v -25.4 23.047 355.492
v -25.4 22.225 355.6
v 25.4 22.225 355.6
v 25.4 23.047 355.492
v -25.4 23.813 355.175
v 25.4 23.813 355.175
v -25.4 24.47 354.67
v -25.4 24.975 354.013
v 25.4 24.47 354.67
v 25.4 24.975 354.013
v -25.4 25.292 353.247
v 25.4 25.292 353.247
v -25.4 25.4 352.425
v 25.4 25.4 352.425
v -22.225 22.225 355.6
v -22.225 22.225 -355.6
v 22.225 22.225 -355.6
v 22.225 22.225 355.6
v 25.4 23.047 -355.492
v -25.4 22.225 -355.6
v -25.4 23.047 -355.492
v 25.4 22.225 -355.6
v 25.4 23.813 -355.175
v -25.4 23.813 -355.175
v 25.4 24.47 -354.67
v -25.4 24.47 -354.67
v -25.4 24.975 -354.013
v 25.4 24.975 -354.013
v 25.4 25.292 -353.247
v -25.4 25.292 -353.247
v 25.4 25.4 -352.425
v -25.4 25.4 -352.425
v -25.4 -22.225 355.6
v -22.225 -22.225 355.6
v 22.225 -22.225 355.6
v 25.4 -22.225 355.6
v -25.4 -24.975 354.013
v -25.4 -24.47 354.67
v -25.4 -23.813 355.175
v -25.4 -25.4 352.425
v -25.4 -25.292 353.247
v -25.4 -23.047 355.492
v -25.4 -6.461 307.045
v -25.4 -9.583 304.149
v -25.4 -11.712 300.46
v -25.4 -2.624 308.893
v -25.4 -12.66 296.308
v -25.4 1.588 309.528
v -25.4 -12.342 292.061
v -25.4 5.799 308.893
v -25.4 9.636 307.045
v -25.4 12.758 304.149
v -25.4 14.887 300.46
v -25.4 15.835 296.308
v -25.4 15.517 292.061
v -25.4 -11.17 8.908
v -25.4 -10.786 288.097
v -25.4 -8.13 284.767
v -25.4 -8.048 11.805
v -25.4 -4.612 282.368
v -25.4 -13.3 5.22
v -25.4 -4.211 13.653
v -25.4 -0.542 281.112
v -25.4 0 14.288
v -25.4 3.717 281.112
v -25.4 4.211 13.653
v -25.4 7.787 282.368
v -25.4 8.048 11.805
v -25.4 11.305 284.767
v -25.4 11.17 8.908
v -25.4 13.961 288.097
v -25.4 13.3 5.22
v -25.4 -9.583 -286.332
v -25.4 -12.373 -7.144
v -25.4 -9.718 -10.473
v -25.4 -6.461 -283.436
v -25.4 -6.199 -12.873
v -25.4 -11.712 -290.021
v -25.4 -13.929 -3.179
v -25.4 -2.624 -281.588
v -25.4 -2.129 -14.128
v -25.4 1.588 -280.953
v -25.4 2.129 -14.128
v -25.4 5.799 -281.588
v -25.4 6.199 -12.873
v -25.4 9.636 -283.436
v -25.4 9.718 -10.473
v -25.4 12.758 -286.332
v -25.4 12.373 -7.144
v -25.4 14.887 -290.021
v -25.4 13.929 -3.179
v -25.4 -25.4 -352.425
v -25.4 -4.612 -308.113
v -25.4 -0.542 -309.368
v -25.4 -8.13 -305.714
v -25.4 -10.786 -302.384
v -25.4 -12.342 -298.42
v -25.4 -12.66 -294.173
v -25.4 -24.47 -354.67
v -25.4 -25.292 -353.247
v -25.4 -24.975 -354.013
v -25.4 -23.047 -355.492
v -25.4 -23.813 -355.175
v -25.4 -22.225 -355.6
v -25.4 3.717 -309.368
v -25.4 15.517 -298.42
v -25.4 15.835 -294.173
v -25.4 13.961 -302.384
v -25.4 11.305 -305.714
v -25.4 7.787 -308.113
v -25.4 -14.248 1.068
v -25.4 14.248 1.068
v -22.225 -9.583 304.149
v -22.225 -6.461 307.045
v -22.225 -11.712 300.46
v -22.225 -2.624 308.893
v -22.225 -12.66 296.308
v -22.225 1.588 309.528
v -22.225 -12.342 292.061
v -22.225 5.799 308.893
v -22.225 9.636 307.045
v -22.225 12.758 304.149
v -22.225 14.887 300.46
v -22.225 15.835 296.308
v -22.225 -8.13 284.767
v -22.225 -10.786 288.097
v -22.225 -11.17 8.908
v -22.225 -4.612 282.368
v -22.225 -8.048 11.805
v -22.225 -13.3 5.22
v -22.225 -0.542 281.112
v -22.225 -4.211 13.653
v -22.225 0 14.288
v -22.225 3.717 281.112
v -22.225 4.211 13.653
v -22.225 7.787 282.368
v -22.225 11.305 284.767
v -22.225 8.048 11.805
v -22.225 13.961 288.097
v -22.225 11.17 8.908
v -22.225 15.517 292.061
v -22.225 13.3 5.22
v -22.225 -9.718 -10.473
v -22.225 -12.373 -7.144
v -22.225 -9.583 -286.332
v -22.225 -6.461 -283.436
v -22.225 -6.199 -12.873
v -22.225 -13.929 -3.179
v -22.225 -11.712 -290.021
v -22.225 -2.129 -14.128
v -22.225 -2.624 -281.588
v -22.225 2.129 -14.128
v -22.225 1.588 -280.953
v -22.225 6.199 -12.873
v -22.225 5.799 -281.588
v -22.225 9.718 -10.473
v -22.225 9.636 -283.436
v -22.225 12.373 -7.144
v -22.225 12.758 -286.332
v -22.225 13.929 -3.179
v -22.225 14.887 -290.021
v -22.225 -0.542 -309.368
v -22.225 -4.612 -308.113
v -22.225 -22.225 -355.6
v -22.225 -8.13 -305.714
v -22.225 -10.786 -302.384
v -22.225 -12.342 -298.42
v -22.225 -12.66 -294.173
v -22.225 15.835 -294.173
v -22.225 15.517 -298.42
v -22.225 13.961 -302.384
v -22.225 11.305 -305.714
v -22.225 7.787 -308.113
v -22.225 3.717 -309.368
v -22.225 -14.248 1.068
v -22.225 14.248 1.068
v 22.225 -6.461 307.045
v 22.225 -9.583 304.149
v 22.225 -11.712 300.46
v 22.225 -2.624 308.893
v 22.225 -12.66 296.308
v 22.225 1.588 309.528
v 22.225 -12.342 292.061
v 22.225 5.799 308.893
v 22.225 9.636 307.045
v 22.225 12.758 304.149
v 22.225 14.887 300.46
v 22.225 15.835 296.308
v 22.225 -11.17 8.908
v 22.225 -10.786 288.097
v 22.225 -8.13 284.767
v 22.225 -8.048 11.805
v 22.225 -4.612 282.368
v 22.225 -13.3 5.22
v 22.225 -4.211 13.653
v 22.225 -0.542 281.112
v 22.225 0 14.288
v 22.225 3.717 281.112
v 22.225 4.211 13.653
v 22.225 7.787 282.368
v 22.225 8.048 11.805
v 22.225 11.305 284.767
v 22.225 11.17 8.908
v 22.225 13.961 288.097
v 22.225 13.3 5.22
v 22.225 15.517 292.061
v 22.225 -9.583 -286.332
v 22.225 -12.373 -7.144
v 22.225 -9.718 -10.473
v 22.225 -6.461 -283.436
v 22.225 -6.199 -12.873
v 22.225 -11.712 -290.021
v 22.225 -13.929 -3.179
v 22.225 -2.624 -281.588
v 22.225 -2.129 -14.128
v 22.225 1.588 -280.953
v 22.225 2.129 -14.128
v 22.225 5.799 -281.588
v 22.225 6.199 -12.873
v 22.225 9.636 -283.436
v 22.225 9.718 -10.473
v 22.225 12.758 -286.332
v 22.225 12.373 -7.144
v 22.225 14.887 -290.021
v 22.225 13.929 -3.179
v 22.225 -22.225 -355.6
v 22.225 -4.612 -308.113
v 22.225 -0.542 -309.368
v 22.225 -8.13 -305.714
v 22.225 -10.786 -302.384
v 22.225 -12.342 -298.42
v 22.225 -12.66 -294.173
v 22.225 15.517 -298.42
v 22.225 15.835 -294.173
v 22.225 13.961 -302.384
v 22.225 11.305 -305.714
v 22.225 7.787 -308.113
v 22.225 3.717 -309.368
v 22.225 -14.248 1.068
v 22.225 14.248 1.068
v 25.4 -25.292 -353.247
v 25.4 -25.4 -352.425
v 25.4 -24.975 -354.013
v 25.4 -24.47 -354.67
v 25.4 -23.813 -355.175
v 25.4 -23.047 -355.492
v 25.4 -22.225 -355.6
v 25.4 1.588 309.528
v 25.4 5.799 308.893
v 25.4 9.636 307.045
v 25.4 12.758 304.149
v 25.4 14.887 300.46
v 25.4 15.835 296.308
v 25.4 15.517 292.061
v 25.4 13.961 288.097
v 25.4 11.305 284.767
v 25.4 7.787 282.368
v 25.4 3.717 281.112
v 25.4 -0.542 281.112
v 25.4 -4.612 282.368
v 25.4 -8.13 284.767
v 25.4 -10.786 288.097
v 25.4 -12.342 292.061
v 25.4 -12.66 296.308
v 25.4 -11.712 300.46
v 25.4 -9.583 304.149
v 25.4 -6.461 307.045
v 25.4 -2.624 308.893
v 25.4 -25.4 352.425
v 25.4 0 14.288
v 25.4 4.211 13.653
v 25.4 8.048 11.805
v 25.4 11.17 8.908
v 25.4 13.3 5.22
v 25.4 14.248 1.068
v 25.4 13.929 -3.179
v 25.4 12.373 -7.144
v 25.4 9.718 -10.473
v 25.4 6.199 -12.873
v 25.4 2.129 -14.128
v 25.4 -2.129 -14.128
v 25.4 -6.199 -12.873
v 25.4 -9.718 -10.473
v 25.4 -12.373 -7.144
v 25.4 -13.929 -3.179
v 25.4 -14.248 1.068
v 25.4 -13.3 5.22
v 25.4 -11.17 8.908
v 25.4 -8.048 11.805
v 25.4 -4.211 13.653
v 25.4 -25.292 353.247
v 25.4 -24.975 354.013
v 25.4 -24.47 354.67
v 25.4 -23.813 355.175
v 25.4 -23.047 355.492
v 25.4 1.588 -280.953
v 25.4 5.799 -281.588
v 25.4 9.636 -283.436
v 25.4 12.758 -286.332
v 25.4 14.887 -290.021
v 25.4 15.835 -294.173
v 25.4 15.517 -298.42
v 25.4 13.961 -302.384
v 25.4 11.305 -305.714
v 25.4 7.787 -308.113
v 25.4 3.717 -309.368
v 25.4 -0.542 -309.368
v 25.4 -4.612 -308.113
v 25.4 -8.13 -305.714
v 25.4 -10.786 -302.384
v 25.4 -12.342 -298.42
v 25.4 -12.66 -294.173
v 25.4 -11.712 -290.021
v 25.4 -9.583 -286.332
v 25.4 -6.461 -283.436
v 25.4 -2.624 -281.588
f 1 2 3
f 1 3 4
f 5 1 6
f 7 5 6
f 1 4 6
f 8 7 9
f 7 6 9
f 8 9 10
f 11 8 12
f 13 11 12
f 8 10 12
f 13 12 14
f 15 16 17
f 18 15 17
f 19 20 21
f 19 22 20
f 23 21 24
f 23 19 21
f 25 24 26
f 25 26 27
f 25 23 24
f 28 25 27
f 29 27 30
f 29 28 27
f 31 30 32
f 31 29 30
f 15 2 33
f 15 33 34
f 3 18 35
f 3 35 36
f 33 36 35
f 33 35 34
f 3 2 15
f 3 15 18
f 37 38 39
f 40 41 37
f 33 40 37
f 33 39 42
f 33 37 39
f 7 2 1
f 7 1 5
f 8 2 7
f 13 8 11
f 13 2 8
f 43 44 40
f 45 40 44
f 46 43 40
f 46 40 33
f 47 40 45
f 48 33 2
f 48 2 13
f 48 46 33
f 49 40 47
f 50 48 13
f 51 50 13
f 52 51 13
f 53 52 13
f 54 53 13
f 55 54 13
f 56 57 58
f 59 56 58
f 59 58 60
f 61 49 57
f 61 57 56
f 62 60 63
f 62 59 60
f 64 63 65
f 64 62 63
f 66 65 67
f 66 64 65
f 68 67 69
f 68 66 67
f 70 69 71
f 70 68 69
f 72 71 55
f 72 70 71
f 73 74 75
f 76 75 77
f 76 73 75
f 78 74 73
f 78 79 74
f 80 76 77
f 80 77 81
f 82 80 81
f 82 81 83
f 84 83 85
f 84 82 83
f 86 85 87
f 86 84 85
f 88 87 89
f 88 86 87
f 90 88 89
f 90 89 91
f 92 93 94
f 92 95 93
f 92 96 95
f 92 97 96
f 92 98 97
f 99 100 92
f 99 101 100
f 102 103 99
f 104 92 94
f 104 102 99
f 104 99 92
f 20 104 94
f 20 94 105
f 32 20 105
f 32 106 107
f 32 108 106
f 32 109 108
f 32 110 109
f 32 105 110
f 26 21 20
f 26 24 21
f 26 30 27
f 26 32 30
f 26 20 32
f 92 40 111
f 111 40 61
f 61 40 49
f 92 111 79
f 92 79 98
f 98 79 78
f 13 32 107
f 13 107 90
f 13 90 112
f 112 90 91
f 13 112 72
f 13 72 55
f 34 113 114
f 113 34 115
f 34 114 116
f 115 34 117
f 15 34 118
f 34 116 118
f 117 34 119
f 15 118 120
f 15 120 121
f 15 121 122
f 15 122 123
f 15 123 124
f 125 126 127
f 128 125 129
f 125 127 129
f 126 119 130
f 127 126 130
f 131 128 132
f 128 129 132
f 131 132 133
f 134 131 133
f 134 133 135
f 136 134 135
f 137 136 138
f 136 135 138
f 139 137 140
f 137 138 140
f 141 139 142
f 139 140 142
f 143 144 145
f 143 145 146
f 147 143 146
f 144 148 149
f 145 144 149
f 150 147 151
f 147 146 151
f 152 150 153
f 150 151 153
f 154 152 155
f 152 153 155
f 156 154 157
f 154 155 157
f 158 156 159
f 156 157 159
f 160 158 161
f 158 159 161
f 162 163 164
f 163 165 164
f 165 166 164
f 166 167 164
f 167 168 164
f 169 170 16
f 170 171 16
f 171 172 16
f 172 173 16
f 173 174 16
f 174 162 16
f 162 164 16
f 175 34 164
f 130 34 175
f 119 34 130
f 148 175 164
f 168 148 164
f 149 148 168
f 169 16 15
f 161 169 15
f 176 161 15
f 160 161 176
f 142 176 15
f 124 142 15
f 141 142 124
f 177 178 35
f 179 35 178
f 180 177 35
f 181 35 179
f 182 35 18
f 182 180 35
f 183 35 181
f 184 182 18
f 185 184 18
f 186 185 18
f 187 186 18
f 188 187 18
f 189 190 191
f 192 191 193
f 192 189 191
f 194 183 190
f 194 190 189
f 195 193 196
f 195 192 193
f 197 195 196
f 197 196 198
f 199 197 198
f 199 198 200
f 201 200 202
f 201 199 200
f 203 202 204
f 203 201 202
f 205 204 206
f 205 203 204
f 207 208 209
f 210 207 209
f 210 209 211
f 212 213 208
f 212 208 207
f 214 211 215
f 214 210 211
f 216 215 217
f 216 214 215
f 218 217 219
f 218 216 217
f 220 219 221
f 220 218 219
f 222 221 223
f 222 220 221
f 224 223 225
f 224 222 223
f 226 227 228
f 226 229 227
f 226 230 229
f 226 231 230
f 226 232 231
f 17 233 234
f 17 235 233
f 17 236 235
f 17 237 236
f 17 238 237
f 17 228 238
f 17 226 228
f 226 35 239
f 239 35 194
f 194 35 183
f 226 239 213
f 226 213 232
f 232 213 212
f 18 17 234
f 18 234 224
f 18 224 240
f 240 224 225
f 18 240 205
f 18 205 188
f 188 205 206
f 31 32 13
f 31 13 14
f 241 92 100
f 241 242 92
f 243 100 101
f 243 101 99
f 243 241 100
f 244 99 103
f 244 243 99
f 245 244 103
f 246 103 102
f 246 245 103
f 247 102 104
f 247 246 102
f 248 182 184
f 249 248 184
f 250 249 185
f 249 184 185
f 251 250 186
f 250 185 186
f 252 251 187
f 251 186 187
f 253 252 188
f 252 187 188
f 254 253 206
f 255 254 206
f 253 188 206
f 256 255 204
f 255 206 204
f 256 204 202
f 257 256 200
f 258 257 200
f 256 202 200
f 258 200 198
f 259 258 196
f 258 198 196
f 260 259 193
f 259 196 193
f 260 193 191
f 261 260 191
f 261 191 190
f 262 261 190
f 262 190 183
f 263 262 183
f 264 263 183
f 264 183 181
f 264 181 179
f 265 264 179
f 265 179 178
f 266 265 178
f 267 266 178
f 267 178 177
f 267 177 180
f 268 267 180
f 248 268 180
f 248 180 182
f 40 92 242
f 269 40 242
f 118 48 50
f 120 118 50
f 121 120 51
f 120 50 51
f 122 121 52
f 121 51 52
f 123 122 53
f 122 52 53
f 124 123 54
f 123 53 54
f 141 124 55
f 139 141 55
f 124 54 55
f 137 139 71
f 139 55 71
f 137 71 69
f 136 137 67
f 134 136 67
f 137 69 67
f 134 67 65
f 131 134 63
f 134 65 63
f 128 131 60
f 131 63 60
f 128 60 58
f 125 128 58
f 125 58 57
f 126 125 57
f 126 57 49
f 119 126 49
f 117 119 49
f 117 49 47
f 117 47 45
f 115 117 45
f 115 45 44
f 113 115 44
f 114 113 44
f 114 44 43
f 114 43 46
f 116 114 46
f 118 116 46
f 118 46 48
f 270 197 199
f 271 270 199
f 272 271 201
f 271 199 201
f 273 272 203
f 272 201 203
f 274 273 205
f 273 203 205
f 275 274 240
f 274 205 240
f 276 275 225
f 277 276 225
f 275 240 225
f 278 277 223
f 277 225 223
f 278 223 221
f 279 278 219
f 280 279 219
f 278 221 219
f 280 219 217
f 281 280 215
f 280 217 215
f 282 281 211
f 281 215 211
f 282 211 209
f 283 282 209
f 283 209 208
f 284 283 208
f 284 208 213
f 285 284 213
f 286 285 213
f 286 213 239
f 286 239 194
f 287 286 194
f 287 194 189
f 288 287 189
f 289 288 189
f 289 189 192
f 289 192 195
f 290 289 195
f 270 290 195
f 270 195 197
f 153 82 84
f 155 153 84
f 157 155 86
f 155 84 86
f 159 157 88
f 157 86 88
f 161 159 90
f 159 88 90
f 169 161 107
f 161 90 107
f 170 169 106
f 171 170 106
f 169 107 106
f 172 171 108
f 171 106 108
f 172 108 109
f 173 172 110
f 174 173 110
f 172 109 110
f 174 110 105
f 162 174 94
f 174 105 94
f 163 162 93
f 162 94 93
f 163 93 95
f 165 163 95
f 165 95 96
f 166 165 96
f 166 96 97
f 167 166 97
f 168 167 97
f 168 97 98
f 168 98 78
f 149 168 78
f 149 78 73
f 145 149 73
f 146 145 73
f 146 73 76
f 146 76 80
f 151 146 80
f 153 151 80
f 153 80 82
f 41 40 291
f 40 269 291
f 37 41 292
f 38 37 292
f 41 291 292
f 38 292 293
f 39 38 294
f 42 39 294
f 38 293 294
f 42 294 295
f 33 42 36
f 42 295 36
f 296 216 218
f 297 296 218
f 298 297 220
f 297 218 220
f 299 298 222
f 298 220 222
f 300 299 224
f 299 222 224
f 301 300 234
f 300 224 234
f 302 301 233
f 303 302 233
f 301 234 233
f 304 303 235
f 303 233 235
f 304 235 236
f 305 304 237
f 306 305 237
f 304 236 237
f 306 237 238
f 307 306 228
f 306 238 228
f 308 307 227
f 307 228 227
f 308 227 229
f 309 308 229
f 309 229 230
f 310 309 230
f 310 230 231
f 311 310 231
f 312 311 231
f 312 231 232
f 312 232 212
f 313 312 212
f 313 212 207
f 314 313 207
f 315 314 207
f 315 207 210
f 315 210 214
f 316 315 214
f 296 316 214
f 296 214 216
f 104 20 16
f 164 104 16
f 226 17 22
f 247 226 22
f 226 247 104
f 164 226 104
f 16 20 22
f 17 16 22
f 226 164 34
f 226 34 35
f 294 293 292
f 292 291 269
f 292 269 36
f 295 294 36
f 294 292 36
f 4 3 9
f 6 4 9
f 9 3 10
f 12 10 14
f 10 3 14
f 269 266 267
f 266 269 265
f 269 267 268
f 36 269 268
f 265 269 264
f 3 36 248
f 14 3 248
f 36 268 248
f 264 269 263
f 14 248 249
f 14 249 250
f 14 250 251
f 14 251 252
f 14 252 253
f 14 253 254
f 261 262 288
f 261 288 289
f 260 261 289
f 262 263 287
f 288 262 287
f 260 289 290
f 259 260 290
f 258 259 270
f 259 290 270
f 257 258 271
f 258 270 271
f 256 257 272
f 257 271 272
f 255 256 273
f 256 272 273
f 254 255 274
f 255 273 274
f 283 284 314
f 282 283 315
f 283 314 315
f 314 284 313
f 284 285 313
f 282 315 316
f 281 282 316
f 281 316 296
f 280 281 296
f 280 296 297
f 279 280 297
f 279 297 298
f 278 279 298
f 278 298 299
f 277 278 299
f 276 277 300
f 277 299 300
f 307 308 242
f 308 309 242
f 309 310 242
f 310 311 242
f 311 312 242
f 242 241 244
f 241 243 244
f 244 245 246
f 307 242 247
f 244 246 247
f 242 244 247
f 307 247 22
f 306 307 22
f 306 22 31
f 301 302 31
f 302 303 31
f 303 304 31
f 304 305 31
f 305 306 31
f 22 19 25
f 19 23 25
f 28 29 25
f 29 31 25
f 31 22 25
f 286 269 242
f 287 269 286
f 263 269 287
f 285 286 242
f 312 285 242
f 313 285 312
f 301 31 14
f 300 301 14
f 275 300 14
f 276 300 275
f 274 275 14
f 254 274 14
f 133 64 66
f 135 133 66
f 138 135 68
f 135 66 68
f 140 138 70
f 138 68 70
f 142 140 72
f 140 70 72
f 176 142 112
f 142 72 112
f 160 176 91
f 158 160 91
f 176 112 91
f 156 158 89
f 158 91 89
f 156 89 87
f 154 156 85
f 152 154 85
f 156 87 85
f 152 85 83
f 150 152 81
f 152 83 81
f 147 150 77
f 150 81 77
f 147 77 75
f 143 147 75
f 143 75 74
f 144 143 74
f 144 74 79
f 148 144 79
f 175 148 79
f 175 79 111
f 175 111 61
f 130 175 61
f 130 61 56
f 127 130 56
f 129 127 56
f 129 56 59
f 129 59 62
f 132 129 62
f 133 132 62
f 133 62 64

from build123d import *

# Parameters (mm, degrees)
BOSS_EXTRUDE1_DEPTH      = 355.6
BOSS_EXTRUDE1_DEPTH_BACK = 355.6
SKETCH1_W                = 50.8
SKETCH1_H                = 50.8
SKETCH1_W_2              = 44.45
SKETCH1_H_2              = 44.45
SKETCH2_R                = 14.2875
CUT_EXTRUDE1_DEPTH       = 361.10715072
FILLET1_R                = 3.175


with BuildPart() as part:
    # Sketch1 → Boss-Extrude1 (new, two sides: drawn at the far end of the back side and taken through both)
    with BuildSketch(Plane.XY.offset(-BOSS_EXTRUDE1_DEPTH_BACK)):
        Rectangle(SKETCH1_W, SKETCH1_H)
        Rectangle(SKETCH1_W_2, SKETCH1_H_2, mode=Mode.SUBTRACT)
    extrude(amount=BOSS_EXTRUDE1_DEPTH + BOSS_EXTRUDE1_DEPTH_BACK)

    # Sketch2 → Cut-Extrude1 (cut, through all)
    with BuildSketch(Plane.ZY.offset(25.4)):
        with Locations((-295.240391678, 1.5875)):
            Circle(SKETCH2_R)
        Circle(SKETCH2_R)
        with Locations((295.240391678, 1.5875)):
            Circle(SKETCH2_R)
    extrude(amount=-CUT_EXTRUDE1_DEPTH, mode=Mode.SUBTRACT)

    # Fillet1
    fillet1_edges = [part.edges().sort_by_distance(p)[0] for p in [
        (0, -25.4, -355.6),
        (0, 25.4, 355.6),
        (0, -25.4, 355.6),
        (0, 25.4, -355.6),
    ]]
    fillet(fillet1_edges, radius=FILLET1_R - 0.0001)  # a hair under: the kernel refuses the full size


solid = part.part
